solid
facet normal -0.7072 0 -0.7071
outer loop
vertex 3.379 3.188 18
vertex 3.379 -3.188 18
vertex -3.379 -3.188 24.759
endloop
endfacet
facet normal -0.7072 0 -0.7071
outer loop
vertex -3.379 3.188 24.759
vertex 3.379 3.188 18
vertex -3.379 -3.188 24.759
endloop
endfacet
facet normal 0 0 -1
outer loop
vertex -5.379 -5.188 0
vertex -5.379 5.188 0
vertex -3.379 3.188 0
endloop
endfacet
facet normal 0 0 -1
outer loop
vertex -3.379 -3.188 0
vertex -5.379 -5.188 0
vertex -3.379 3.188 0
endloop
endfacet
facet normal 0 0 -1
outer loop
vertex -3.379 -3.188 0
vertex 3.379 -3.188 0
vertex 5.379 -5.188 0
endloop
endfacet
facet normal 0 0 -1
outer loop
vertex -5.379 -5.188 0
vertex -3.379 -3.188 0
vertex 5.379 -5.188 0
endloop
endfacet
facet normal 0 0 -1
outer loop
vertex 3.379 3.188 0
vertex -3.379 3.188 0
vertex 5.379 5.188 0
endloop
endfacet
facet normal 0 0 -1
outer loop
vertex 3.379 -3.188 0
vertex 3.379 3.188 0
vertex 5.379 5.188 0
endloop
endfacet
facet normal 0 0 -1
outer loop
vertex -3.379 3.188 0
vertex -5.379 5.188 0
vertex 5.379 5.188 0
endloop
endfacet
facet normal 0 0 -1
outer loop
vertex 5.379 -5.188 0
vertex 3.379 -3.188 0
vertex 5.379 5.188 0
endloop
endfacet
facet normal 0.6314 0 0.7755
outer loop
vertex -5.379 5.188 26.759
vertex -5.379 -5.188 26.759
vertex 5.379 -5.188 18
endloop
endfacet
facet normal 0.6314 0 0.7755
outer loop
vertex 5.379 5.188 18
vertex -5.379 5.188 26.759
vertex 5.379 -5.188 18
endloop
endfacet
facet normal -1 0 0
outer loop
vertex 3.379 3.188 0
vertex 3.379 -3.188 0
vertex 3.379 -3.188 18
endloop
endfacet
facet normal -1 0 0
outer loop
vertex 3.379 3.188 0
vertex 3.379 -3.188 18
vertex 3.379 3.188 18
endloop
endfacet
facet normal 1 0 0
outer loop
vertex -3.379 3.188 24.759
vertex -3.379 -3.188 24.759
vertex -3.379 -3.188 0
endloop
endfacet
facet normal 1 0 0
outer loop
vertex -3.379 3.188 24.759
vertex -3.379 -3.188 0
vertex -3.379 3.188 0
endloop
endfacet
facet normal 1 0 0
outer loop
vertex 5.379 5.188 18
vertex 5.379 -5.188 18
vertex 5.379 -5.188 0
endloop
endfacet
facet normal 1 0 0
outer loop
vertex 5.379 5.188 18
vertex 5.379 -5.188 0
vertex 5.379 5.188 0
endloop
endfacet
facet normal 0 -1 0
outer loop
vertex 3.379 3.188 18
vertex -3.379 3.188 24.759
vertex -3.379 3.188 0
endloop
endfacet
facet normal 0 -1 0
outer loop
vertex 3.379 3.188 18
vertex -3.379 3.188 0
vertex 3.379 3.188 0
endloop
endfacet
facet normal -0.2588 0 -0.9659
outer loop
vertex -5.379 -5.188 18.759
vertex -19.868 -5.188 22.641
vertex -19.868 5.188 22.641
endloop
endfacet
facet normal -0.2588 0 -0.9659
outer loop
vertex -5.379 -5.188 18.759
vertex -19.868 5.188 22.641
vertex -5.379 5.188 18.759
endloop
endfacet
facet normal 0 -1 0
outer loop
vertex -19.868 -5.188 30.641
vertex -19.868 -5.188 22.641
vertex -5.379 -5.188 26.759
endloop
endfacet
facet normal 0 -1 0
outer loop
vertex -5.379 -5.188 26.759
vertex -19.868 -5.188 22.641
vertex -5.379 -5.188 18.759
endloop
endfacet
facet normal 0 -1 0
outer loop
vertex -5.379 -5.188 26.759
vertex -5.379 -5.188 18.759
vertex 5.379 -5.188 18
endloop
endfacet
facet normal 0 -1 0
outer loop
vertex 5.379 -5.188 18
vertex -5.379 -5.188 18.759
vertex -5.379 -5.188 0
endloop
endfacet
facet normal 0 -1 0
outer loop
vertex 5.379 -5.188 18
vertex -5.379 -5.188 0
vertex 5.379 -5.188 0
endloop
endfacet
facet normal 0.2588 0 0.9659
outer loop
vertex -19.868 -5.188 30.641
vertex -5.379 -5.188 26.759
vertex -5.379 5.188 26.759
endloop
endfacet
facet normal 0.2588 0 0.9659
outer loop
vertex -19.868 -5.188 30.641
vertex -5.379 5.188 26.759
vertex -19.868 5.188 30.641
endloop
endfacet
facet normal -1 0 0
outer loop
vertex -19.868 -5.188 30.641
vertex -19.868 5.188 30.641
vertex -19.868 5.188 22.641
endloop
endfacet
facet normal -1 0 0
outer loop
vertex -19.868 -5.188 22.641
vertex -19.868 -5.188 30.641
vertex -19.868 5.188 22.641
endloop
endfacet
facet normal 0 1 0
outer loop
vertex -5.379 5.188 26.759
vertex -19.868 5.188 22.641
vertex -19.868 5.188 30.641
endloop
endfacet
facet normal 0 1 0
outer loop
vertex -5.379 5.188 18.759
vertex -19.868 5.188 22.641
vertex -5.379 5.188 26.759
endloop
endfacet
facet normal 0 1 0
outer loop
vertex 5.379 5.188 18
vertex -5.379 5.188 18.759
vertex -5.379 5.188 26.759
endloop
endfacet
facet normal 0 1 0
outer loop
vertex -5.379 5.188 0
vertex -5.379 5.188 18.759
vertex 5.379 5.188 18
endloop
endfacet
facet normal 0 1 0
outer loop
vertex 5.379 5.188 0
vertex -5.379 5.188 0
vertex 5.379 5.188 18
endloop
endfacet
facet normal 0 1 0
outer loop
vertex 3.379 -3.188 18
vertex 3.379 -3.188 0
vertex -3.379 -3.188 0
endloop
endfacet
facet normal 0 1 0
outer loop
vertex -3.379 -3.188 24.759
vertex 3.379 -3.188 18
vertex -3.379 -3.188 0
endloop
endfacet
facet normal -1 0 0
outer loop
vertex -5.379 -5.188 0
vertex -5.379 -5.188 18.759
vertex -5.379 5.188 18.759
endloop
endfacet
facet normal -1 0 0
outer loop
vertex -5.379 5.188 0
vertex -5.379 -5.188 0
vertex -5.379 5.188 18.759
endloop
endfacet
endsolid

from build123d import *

# Parameters (mm, degrees)
SKETCH1_W           = 10.758936
SKETCH1_H           = 10.375
SKETCH1_W_2         = 6.758936
SKETCH1_H_2         = 6.375
BOSS_EXTRUDE1_DEPTH = 18
BOSS_EXTRUDE2_DEPTH = 2
BOSS_EXTRUDE3_REACH = 21.49
SKETCH3_W           = 10.758936
SKETCH3_H           = 10.375
SKETCH3_W_2         = 6.758936
SKETCH3_H_2         = 6.375
BOSS_EXTRUDE7_DEPTH = 10.375
BOSS_EXTRUDE8_DEPTH = 10.375


with BuildPart() as part:
    # Sketch1 → Boss-Extrude1 (new body)
    with BuildSketch(Plane.XY):
        Rectangle(SKETCH1_W, SKETCH1_H)
        Rectangle(SKETCH1_W_2, SKETCH1_H_2, mode=Mode.SUBTRACT)
    extrude(amount=BOSS_EXTRUDE1_DEPTH)

    # Sketch2 → Boss-Extrude2 (add)
    with BuildSketch(Plane(origin=(0, -3.1875, 0), x_dir=(1, 0, 0), z_dir=(0, 1, 0))):
        Polygon((3.379468, -18), (-3.550178456, -24.929646456), (-3.379468, -18), align=None)
    extrude(amount=-BOSS_EXTRUDE2_DEPTH)

    # Boss-Extrude3: up to this face of the body (flat: up to its plane)
    boss_extrude3_end = Plane(part.part.faces().sort_by_distance((-0.085355228, -4.1875, 21.464823228))[0])
    # Sketch3 → Boss-Extrude3 (add, up to the picked face)
    with BuildSketch(Plane.XY.offset(18), mode=Mode.PRIVATE) as boss_extrude3_sk1:
        Rectangle(SKETCH3_W, SKETCH3_H)
        Rectangle(SKETCH3_W_2, SKETCH3_H_2, mode=Mode.SUBTRACT)
    boss_extrude3_tool1 = split(extrude(boss_extrude3_sk1.sketch, amount=BOSS_EXTRUDE3_REACH, mode=Mode.PRIVATE), bisect_by=boss_extrude3_end, keep=Keep.BOTH, mode=Mode.PRIVATE)
    add(boss_extrude3_tool1.solids().sort_by(Axis((0, -5.038036, 18), (0, 0, 1)))[0])

    # Sketch7 → Boss-Extrude7 (add)
    with BuildSketch(Plane(origin=(0, -5.1875, 0), x_dir=(-1, 0, 0), z_dir=(0, -1, 0))):
        Polygon((5.379468, -26.758936), (19.868355394, -30.641221677), (19.868355394, -22.641221677), (5.379468, -18.758936), align=None)
    extrude(amount=-BOSS_EXTRUDE7_DEPTH)

    # Sketch8 → Boss-Extrude8 (add)
    with BuildSketch(Plane(origin=(0, -5.1875, 0), x_dir=(-1, 0, 0), z_dir=(0, -1, 0))):
        Polygon((5.379468, -26.758936), (-5.379468, -18), (-3.379468, -18), align=None)
    extrude(amount=-BOSS_EXTRUDE8_DEPTH)


solid = part.part
